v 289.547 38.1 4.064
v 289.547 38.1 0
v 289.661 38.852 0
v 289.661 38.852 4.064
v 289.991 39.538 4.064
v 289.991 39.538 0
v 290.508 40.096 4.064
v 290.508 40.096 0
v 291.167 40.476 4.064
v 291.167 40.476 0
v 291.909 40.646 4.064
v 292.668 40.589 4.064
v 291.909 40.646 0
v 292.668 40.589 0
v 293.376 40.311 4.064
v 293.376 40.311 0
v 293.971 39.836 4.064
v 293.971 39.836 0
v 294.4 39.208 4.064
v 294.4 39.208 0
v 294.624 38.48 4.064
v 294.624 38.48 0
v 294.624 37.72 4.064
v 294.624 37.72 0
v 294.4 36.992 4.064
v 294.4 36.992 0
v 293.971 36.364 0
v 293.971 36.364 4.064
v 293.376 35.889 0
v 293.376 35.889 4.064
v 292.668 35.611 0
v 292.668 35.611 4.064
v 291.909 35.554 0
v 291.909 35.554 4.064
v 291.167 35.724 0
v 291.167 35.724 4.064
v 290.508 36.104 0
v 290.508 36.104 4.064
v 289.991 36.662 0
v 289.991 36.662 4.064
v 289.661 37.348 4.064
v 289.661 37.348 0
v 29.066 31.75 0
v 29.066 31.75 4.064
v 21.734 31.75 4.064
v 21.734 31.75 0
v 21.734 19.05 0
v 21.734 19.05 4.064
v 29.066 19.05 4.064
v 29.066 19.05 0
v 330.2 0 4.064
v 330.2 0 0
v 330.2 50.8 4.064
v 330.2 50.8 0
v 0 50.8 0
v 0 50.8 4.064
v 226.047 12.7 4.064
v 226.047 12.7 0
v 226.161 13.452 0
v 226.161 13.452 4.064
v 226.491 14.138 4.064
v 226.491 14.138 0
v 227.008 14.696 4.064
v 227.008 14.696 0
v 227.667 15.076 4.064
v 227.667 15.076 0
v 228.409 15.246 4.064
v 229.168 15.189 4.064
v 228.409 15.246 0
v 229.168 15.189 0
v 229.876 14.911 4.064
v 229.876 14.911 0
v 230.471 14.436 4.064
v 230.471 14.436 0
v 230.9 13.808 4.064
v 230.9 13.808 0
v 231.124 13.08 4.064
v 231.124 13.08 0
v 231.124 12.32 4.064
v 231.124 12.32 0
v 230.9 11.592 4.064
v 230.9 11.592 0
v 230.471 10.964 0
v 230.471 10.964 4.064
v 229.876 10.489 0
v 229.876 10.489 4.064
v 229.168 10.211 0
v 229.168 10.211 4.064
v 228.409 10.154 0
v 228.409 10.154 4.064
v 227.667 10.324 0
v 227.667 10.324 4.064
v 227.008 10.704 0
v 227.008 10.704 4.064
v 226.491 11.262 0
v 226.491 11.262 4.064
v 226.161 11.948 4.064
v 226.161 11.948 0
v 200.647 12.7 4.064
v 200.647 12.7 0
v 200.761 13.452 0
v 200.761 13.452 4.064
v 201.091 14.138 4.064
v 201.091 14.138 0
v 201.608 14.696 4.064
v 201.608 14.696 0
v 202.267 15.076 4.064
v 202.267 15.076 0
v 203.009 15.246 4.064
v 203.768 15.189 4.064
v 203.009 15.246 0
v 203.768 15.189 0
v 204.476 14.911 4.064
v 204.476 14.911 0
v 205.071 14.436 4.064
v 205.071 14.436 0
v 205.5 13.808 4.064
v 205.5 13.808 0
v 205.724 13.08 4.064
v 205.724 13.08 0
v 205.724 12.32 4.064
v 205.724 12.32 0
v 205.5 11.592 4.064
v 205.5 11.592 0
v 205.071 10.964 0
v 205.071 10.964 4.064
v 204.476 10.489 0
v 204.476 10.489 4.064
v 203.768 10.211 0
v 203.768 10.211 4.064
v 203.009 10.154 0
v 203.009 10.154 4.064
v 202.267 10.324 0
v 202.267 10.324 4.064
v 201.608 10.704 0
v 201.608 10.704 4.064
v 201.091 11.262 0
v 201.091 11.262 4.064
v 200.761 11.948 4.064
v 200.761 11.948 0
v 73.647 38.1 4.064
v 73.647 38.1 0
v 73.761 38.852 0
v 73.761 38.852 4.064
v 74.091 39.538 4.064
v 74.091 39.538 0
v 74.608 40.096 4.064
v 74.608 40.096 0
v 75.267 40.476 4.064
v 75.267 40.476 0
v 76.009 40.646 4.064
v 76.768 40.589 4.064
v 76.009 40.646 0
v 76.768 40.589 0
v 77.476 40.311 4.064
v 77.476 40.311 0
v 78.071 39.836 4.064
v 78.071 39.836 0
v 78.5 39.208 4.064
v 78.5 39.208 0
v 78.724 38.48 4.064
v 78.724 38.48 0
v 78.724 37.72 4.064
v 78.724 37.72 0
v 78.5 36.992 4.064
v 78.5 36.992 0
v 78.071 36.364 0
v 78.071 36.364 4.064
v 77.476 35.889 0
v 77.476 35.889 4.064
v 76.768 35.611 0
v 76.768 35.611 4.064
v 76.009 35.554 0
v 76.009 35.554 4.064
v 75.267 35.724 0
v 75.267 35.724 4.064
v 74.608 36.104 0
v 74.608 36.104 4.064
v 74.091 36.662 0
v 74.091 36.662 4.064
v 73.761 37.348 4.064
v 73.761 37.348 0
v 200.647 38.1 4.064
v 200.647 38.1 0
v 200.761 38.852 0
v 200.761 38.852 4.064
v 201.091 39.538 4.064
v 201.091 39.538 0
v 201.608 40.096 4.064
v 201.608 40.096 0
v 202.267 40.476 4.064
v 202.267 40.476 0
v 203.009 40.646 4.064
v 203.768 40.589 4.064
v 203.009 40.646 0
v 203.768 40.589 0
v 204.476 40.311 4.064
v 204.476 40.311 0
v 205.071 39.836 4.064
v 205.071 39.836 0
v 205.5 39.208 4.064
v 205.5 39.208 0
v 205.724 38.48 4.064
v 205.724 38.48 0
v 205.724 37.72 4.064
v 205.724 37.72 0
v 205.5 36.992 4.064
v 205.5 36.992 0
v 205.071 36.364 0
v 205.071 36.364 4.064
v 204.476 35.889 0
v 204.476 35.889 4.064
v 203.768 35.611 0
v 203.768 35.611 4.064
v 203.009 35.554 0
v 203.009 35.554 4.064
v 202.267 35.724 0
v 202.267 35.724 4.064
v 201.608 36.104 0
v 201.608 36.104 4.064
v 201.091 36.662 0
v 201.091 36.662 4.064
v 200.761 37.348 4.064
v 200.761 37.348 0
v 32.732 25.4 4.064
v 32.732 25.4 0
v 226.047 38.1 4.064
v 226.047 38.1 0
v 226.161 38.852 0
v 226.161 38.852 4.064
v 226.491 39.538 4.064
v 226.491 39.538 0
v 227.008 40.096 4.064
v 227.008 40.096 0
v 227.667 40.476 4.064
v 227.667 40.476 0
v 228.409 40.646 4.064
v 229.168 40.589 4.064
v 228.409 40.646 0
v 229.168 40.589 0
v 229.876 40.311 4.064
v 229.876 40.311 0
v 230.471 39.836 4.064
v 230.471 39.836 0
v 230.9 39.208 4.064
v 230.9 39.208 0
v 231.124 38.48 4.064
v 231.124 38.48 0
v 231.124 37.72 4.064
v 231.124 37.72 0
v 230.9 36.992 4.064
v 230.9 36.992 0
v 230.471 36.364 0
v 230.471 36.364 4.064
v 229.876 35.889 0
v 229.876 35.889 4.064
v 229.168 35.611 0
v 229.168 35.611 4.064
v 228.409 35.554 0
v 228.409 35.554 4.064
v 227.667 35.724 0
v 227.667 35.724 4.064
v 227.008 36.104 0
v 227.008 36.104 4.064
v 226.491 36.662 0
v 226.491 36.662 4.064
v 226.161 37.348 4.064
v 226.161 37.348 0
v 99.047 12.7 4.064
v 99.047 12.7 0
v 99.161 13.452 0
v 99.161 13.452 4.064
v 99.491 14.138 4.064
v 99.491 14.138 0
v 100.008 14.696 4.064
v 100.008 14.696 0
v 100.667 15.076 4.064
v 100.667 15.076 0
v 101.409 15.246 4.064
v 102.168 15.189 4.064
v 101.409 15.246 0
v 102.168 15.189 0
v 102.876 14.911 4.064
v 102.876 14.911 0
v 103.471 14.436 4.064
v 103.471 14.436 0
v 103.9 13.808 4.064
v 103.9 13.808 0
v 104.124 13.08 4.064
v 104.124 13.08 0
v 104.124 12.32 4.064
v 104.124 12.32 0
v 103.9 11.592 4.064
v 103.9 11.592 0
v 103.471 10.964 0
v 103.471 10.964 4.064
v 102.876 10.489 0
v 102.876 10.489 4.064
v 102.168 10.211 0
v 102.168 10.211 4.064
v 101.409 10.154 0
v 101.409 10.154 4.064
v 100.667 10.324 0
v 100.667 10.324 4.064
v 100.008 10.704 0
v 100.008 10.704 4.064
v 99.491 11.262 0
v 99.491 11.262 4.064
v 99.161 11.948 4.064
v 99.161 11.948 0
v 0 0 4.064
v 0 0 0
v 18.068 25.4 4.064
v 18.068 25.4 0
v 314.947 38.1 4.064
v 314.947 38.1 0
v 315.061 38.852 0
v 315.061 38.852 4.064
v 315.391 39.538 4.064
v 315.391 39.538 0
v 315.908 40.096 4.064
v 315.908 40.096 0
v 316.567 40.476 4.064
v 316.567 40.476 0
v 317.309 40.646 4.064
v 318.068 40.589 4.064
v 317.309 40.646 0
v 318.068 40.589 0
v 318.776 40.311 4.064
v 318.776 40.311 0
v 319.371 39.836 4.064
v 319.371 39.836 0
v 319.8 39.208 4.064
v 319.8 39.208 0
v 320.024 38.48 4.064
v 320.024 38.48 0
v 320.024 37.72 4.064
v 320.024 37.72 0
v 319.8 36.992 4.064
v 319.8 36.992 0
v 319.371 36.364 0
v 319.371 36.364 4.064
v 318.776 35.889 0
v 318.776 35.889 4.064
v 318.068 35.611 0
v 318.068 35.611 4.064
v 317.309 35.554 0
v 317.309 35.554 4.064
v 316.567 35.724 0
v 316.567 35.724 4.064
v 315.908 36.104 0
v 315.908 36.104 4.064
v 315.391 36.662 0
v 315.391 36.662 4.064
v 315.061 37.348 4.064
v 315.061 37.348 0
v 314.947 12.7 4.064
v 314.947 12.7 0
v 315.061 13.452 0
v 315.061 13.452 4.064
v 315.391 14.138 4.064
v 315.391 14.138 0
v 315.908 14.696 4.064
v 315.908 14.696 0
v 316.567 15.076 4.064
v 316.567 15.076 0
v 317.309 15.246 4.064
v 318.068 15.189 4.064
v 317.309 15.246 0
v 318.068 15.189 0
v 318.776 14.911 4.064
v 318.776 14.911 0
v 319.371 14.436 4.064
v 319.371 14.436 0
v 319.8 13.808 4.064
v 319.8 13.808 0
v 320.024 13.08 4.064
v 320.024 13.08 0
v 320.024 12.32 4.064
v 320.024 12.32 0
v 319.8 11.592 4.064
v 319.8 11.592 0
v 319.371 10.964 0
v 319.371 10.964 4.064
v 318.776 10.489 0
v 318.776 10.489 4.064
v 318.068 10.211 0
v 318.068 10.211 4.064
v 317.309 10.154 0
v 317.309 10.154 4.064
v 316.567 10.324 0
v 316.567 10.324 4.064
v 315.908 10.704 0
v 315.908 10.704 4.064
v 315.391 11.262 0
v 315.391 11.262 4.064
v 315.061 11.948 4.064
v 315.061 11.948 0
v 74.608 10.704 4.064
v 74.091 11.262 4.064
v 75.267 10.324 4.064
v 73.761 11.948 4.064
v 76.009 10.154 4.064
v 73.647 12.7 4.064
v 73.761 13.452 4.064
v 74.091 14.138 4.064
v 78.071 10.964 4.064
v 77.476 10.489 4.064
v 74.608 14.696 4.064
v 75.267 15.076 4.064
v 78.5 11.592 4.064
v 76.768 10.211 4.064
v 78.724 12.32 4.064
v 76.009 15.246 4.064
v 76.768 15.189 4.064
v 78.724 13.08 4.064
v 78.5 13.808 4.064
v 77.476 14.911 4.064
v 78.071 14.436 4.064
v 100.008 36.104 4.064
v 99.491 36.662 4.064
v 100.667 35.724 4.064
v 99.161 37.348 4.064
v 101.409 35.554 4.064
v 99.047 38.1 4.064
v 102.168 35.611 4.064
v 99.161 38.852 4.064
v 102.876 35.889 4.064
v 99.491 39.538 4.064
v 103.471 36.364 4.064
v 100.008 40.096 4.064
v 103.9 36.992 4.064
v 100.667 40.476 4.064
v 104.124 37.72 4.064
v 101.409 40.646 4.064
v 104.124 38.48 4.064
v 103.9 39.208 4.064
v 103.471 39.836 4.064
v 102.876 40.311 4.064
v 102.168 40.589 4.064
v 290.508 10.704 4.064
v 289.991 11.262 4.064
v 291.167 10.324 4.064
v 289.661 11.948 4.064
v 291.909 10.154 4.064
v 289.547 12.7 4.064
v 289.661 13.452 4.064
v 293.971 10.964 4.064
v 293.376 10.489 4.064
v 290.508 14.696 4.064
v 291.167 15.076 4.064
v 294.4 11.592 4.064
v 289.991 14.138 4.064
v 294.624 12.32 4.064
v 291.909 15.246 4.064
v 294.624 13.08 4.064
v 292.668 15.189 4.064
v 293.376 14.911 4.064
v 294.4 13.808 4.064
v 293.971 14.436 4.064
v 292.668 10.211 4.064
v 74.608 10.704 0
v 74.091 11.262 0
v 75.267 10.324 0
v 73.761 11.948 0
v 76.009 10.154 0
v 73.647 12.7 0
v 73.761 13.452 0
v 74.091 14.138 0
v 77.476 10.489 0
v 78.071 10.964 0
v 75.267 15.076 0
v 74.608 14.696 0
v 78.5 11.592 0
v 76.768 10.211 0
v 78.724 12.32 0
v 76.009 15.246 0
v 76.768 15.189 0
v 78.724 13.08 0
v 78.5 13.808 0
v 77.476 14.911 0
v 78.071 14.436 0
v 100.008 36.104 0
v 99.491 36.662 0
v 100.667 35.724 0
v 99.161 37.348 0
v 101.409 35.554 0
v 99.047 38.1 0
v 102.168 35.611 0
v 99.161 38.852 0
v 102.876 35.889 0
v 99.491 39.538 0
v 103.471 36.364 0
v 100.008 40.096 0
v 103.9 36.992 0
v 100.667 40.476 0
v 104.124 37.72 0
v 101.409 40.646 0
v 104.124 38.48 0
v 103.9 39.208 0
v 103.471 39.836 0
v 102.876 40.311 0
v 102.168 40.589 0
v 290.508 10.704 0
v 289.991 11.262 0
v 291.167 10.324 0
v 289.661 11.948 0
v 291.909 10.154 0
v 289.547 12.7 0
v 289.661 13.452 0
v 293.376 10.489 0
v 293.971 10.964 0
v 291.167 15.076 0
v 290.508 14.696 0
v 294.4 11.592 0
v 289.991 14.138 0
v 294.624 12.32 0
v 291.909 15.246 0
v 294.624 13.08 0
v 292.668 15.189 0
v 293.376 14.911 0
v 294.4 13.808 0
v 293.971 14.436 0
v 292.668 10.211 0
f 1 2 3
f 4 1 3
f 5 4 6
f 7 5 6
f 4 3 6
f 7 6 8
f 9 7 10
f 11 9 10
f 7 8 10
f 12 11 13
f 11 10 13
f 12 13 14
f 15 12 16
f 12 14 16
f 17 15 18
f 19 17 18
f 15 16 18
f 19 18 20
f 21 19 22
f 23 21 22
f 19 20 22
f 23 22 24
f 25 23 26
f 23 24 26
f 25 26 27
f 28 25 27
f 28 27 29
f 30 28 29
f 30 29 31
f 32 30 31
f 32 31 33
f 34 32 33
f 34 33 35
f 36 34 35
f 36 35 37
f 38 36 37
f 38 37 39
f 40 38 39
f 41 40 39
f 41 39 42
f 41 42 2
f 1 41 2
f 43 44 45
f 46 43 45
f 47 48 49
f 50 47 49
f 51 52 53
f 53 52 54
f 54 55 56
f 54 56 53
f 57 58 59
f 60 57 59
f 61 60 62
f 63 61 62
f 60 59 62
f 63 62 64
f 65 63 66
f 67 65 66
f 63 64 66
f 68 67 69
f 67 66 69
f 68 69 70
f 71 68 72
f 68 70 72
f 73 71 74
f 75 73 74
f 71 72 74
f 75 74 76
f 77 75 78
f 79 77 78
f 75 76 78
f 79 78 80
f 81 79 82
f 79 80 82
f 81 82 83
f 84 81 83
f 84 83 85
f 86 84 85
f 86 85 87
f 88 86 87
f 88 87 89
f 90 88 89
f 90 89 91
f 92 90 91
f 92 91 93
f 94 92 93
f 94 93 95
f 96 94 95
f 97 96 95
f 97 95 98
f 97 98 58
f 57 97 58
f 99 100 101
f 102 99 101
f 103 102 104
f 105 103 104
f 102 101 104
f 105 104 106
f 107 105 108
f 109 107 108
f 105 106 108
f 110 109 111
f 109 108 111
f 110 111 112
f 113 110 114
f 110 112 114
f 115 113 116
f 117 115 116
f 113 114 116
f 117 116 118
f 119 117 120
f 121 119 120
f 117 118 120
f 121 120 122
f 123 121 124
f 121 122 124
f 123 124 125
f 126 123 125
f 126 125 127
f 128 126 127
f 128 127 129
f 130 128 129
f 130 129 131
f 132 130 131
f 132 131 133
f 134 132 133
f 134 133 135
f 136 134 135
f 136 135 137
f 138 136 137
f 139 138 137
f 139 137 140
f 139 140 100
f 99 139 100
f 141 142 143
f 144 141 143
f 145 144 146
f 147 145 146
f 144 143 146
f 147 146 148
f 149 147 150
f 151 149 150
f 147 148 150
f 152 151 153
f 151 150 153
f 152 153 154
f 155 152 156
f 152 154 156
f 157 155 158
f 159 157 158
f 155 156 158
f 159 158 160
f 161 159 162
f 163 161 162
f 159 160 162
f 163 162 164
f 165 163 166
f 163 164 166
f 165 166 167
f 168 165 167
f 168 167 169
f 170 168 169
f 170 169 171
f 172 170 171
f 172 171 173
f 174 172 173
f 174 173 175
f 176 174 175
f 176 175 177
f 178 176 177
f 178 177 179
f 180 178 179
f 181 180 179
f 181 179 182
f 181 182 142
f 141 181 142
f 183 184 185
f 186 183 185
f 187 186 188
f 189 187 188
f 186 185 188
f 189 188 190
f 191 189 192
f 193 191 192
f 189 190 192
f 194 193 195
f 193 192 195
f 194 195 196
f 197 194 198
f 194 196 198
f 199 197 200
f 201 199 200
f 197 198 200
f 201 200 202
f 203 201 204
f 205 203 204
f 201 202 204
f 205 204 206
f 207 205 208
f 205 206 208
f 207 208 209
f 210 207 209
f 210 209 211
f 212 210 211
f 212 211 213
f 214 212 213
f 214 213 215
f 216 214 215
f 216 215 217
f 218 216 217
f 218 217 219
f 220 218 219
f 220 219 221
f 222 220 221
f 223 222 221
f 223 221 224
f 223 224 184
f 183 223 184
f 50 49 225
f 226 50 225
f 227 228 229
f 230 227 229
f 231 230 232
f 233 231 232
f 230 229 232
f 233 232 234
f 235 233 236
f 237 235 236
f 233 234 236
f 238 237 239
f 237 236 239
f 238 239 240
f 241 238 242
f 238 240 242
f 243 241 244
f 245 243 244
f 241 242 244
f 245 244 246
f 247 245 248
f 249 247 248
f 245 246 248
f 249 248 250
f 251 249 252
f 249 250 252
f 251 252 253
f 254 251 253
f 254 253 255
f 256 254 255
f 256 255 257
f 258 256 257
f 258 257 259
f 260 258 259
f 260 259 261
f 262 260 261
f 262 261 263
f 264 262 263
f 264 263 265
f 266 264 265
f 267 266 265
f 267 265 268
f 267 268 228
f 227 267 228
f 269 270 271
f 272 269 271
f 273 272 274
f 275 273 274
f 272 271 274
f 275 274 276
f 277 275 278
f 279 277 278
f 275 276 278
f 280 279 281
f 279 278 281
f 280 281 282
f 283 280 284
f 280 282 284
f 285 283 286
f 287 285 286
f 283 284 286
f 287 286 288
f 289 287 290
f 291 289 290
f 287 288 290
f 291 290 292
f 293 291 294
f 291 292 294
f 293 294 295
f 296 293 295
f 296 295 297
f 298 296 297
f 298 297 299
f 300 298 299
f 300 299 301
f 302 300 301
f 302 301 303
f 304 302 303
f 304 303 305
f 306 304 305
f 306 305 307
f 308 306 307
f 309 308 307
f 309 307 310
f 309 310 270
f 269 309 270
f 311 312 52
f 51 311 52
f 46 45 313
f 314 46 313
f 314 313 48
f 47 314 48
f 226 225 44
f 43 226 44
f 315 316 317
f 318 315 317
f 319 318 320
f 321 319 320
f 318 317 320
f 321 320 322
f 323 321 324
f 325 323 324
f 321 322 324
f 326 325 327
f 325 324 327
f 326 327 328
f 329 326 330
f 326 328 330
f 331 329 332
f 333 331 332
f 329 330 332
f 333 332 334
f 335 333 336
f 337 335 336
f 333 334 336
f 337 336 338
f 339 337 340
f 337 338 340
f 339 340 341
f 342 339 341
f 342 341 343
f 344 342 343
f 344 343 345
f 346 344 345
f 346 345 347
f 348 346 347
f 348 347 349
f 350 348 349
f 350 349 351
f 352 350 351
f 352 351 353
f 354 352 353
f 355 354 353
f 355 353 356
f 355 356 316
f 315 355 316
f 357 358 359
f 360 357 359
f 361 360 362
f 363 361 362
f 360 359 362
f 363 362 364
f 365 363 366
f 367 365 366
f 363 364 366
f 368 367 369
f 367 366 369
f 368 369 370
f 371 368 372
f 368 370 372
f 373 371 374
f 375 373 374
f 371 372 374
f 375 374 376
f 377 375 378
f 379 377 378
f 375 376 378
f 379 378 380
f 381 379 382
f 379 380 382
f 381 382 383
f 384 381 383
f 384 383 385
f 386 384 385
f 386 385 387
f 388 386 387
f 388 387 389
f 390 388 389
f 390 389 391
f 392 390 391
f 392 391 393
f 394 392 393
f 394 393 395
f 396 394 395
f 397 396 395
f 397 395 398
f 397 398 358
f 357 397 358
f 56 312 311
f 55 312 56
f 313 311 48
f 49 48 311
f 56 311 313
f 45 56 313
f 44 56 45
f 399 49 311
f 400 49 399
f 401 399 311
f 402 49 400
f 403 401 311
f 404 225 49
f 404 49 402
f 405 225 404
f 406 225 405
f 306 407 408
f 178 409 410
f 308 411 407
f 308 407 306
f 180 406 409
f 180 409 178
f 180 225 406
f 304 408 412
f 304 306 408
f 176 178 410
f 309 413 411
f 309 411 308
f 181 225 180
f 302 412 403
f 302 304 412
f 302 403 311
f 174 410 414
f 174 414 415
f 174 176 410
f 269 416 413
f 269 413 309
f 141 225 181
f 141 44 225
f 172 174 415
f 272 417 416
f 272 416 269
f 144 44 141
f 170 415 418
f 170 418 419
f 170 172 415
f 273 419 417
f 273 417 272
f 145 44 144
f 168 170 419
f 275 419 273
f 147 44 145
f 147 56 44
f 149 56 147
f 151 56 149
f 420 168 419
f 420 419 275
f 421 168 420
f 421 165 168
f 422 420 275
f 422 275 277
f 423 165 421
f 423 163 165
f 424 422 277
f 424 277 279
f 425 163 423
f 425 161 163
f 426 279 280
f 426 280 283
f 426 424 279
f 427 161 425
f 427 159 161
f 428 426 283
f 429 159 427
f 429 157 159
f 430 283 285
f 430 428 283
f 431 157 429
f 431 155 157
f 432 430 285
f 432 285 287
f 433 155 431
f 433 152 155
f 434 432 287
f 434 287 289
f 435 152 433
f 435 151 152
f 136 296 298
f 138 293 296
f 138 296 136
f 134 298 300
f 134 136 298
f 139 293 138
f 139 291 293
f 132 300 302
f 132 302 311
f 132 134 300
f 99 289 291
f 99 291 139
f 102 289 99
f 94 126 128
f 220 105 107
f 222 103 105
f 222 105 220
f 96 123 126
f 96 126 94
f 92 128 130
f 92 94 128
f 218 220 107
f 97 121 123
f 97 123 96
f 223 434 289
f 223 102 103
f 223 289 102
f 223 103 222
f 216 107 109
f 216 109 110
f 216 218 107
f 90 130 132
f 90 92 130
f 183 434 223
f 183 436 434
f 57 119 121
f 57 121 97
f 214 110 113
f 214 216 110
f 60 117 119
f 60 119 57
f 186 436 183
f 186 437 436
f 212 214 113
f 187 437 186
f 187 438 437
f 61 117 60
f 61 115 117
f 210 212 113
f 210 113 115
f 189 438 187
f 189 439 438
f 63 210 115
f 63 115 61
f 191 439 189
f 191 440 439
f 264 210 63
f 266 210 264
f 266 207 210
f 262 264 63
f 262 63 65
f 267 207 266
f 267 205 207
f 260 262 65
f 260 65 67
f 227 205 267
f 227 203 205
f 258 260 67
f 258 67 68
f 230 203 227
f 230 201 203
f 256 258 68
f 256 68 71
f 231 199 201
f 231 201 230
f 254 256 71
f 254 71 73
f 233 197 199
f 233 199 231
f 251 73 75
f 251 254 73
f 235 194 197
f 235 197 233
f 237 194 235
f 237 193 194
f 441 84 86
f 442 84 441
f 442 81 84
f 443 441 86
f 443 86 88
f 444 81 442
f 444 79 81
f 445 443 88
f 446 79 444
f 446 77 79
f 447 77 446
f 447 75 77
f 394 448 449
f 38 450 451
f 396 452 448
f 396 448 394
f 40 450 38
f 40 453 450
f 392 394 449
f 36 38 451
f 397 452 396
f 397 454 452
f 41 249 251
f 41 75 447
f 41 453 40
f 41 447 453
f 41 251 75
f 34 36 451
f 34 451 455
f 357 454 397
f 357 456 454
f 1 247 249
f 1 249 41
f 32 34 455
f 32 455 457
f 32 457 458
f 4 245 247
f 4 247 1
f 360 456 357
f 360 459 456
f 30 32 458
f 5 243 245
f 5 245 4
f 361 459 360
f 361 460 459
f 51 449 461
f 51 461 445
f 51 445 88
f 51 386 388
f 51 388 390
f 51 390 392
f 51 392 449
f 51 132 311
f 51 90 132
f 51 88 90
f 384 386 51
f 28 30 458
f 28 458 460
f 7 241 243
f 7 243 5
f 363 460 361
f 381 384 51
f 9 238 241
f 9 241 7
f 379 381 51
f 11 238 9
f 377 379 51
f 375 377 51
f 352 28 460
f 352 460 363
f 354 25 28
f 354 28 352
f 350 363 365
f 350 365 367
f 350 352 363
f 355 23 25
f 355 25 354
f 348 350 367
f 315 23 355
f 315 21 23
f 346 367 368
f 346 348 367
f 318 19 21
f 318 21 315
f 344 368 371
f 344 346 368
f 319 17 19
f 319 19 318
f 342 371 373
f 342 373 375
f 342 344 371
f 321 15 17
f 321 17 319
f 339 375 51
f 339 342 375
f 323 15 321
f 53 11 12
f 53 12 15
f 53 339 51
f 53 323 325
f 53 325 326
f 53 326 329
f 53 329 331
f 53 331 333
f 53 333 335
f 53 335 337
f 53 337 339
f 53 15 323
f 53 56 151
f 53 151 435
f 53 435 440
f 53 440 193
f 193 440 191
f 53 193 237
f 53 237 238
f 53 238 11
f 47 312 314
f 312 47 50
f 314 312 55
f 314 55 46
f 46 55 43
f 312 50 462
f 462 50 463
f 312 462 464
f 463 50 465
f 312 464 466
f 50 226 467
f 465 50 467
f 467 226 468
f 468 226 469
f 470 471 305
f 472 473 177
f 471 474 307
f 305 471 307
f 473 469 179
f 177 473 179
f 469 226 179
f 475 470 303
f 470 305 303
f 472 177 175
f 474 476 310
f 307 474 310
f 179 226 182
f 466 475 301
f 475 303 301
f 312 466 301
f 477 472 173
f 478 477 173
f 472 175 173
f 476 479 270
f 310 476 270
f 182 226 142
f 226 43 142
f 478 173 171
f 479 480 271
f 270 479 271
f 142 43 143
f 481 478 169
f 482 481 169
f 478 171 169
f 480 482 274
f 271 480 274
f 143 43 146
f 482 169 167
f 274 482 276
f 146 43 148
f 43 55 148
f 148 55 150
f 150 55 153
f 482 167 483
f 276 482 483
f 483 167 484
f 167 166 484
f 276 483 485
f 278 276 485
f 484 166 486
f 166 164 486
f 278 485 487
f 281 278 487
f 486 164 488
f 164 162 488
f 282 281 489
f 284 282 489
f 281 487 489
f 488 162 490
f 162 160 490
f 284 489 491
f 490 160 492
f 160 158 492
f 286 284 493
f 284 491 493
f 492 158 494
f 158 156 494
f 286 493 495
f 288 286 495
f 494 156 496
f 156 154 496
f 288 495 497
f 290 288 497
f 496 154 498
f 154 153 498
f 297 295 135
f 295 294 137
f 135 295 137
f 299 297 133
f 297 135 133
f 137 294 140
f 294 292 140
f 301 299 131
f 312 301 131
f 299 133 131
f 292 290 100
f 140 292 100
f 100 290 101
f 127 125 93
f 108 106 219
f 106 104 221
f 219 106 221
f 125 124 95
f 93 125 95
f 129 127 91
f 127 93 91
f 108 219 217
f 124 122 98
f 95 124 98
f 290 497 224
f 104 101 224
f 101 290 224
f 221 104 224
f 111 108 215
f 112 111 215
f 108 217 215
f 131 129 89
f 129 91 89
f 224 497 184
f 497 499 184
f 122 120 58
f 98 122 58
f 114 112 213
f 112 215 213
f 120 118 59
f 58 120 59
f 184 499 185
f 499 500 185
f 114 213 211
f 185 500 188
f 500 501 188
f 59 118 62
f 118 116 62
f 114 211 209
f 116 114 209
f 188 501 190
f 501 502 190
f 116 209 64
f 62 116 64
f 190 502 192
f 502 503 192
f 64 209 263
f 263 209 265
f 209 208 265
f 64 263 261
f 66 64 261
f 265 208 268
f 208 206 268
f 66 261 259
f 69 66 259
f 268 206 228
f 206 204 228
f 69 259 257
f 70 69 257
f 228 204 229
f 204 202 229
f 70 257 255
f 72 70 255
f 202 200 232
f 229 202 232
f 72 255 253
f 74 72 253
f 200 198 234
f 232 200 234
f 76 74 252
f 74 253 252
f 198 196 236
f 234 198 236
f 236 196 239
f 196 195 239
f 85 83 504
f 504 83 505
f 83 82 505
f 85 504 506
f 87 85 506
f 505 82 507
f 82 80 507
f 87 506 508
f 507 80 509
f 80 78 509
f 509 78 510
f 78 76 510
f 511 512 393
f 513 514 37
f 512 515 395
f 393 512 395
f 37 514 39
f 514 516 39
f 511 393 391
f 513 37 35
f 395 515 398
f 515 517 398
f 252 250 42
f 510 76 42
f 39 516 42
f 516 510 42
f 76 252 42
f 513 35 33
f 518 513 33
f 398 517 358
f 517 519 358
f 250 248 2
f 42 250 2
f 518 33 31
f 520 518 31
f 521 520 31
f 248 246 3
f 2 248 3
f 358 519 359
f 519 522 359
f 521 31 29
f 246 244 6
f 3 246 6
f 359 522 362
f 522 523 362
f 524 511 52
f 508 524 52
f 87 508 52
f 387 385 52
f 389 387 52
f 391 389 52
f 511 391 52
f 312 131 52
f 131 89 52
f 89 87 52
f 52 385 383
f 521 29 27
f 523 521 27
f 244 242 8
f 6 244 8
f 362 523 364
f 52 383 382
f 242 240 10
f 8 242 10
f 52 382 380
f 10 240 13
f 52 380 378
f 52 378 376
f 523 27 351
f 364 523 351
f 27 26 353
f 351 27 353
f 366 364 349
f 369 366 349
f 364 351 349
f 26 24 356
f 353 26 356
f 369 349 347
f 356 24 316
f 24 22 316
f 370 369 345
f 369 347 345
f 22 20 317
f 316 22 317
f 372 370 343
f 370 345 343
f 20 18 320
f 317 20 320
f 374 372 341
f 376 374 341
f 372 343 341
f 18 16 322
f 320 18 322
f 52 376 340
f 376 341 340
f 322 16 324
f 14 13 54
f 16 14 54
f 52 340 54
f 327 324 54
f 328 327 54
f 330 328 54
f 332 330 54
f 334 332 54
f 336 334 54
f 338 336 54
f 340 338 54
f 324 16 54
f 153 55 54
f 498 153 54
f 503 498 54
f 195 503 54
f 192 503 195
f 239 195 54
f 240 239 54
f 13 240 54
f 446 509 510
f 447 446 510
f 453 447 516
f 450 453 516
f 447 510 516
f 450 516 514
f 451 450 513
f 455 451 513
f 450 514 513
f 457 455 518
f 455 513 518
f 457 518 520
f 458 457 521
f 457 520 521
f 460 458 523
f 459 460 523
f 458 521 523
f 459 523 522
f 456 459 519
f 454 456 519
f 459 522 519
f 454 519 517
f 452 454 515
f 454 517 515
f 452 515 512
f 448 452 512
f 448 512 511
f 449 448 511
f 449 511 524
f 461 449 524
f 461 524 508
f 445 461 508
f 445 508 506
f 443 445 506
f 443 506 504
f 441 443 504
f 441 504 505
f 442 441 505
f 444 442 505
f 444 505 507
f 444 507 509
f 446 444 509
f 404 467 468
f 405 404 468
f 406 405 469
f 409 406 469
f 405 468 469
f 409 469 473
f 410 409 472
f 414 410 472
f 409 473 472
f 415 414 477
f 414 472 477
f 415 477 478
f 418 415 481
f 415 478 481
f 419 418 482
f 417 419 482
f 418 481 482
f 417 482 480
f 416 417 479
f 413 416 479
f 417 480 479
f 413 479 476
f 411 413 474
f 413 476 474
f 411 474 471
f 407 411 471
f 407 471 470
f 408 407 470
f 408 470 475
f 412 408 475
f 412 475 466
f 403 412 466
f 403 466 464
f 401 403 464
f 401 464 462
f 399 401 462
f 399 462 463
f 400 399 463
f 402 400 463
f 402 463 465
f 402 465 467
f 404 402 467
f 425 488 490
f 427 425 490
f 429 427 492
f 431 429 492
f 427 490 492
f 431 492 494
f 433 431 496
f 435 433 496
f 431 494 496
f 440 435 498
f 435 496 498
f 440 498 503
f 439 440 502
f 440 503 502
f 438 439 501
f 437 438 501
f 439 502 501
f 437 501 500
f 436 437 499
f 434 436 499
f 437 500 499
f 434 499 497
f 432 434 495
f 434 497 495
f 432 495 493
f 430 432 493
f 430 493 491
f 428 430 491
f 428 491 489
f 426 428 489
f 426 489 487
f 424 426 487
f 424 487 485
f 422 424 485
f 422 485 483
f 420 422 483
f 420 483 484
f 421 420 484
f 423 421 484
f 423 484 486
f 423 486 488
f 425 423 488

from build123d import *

# Parameters (mm, degrees)
SKETCH1_W                          = 330.2
SKETCH1_H                          = 50.8
BASE_DEPTH                         = 4.064
F_10_CLEARANCE_HOLE_BASKET_MOUNT_D = 5.1054
PIVOT_HOLE_DEPTH                   = 5.064
F_10_CLEARANCE_HOLE1_D             = 5.1054


with BuildPart() as part:
    # Sketch1 → base (new body)
    with BuildSketch(Plane.XY):
        with Locations((165.1, 25.4)):
            Rectangle(SKETCH1_W, SKETCH1_H)
    extrude(amount=BASE_DEPTH)

    # #10 Clearance Hole - basket mount (through all)
    with Locations(Plane.XY.offset(4.064)):
        with Locations((203.2, 12.7), (228.6, 38.1), (203.2, 38.1), (228.6, 12.7), (76.2, 38.1), (101.6, 12.7), (76.2, 12.7), (101.6, 38.1)):
            Hole(F_10_CLEARANCE_HOLE_BASKET_MOUNT_D / 2)

    # Sketch7 → pivot hole (cut, through all)
    with BuildSketch(Plane.XY.offset(4.064)):
        Polygon((21.733825791, 31.75), (18.067651581, 25.4), (21.733825791, 19.05), (29.066174209, 19.05), (32.732348419, 25.4), (29.066174209, 31.75), align=None)
    extrude(amount=-PIVOT_HOLE_DEPTH, mode=Mode.SUBTRACT)

    # #10 Clearance Hole1 (through all)
    with Locations(Plane.XY.offset(4.064)):
        with Locations((317.5, 38.1), (292.1, 12.7), (317.5, 12.7), (292.1, 38.1)):
            Hole(F_10_CLEARANCE_HOLE1_D / 2)


solid = part.part
